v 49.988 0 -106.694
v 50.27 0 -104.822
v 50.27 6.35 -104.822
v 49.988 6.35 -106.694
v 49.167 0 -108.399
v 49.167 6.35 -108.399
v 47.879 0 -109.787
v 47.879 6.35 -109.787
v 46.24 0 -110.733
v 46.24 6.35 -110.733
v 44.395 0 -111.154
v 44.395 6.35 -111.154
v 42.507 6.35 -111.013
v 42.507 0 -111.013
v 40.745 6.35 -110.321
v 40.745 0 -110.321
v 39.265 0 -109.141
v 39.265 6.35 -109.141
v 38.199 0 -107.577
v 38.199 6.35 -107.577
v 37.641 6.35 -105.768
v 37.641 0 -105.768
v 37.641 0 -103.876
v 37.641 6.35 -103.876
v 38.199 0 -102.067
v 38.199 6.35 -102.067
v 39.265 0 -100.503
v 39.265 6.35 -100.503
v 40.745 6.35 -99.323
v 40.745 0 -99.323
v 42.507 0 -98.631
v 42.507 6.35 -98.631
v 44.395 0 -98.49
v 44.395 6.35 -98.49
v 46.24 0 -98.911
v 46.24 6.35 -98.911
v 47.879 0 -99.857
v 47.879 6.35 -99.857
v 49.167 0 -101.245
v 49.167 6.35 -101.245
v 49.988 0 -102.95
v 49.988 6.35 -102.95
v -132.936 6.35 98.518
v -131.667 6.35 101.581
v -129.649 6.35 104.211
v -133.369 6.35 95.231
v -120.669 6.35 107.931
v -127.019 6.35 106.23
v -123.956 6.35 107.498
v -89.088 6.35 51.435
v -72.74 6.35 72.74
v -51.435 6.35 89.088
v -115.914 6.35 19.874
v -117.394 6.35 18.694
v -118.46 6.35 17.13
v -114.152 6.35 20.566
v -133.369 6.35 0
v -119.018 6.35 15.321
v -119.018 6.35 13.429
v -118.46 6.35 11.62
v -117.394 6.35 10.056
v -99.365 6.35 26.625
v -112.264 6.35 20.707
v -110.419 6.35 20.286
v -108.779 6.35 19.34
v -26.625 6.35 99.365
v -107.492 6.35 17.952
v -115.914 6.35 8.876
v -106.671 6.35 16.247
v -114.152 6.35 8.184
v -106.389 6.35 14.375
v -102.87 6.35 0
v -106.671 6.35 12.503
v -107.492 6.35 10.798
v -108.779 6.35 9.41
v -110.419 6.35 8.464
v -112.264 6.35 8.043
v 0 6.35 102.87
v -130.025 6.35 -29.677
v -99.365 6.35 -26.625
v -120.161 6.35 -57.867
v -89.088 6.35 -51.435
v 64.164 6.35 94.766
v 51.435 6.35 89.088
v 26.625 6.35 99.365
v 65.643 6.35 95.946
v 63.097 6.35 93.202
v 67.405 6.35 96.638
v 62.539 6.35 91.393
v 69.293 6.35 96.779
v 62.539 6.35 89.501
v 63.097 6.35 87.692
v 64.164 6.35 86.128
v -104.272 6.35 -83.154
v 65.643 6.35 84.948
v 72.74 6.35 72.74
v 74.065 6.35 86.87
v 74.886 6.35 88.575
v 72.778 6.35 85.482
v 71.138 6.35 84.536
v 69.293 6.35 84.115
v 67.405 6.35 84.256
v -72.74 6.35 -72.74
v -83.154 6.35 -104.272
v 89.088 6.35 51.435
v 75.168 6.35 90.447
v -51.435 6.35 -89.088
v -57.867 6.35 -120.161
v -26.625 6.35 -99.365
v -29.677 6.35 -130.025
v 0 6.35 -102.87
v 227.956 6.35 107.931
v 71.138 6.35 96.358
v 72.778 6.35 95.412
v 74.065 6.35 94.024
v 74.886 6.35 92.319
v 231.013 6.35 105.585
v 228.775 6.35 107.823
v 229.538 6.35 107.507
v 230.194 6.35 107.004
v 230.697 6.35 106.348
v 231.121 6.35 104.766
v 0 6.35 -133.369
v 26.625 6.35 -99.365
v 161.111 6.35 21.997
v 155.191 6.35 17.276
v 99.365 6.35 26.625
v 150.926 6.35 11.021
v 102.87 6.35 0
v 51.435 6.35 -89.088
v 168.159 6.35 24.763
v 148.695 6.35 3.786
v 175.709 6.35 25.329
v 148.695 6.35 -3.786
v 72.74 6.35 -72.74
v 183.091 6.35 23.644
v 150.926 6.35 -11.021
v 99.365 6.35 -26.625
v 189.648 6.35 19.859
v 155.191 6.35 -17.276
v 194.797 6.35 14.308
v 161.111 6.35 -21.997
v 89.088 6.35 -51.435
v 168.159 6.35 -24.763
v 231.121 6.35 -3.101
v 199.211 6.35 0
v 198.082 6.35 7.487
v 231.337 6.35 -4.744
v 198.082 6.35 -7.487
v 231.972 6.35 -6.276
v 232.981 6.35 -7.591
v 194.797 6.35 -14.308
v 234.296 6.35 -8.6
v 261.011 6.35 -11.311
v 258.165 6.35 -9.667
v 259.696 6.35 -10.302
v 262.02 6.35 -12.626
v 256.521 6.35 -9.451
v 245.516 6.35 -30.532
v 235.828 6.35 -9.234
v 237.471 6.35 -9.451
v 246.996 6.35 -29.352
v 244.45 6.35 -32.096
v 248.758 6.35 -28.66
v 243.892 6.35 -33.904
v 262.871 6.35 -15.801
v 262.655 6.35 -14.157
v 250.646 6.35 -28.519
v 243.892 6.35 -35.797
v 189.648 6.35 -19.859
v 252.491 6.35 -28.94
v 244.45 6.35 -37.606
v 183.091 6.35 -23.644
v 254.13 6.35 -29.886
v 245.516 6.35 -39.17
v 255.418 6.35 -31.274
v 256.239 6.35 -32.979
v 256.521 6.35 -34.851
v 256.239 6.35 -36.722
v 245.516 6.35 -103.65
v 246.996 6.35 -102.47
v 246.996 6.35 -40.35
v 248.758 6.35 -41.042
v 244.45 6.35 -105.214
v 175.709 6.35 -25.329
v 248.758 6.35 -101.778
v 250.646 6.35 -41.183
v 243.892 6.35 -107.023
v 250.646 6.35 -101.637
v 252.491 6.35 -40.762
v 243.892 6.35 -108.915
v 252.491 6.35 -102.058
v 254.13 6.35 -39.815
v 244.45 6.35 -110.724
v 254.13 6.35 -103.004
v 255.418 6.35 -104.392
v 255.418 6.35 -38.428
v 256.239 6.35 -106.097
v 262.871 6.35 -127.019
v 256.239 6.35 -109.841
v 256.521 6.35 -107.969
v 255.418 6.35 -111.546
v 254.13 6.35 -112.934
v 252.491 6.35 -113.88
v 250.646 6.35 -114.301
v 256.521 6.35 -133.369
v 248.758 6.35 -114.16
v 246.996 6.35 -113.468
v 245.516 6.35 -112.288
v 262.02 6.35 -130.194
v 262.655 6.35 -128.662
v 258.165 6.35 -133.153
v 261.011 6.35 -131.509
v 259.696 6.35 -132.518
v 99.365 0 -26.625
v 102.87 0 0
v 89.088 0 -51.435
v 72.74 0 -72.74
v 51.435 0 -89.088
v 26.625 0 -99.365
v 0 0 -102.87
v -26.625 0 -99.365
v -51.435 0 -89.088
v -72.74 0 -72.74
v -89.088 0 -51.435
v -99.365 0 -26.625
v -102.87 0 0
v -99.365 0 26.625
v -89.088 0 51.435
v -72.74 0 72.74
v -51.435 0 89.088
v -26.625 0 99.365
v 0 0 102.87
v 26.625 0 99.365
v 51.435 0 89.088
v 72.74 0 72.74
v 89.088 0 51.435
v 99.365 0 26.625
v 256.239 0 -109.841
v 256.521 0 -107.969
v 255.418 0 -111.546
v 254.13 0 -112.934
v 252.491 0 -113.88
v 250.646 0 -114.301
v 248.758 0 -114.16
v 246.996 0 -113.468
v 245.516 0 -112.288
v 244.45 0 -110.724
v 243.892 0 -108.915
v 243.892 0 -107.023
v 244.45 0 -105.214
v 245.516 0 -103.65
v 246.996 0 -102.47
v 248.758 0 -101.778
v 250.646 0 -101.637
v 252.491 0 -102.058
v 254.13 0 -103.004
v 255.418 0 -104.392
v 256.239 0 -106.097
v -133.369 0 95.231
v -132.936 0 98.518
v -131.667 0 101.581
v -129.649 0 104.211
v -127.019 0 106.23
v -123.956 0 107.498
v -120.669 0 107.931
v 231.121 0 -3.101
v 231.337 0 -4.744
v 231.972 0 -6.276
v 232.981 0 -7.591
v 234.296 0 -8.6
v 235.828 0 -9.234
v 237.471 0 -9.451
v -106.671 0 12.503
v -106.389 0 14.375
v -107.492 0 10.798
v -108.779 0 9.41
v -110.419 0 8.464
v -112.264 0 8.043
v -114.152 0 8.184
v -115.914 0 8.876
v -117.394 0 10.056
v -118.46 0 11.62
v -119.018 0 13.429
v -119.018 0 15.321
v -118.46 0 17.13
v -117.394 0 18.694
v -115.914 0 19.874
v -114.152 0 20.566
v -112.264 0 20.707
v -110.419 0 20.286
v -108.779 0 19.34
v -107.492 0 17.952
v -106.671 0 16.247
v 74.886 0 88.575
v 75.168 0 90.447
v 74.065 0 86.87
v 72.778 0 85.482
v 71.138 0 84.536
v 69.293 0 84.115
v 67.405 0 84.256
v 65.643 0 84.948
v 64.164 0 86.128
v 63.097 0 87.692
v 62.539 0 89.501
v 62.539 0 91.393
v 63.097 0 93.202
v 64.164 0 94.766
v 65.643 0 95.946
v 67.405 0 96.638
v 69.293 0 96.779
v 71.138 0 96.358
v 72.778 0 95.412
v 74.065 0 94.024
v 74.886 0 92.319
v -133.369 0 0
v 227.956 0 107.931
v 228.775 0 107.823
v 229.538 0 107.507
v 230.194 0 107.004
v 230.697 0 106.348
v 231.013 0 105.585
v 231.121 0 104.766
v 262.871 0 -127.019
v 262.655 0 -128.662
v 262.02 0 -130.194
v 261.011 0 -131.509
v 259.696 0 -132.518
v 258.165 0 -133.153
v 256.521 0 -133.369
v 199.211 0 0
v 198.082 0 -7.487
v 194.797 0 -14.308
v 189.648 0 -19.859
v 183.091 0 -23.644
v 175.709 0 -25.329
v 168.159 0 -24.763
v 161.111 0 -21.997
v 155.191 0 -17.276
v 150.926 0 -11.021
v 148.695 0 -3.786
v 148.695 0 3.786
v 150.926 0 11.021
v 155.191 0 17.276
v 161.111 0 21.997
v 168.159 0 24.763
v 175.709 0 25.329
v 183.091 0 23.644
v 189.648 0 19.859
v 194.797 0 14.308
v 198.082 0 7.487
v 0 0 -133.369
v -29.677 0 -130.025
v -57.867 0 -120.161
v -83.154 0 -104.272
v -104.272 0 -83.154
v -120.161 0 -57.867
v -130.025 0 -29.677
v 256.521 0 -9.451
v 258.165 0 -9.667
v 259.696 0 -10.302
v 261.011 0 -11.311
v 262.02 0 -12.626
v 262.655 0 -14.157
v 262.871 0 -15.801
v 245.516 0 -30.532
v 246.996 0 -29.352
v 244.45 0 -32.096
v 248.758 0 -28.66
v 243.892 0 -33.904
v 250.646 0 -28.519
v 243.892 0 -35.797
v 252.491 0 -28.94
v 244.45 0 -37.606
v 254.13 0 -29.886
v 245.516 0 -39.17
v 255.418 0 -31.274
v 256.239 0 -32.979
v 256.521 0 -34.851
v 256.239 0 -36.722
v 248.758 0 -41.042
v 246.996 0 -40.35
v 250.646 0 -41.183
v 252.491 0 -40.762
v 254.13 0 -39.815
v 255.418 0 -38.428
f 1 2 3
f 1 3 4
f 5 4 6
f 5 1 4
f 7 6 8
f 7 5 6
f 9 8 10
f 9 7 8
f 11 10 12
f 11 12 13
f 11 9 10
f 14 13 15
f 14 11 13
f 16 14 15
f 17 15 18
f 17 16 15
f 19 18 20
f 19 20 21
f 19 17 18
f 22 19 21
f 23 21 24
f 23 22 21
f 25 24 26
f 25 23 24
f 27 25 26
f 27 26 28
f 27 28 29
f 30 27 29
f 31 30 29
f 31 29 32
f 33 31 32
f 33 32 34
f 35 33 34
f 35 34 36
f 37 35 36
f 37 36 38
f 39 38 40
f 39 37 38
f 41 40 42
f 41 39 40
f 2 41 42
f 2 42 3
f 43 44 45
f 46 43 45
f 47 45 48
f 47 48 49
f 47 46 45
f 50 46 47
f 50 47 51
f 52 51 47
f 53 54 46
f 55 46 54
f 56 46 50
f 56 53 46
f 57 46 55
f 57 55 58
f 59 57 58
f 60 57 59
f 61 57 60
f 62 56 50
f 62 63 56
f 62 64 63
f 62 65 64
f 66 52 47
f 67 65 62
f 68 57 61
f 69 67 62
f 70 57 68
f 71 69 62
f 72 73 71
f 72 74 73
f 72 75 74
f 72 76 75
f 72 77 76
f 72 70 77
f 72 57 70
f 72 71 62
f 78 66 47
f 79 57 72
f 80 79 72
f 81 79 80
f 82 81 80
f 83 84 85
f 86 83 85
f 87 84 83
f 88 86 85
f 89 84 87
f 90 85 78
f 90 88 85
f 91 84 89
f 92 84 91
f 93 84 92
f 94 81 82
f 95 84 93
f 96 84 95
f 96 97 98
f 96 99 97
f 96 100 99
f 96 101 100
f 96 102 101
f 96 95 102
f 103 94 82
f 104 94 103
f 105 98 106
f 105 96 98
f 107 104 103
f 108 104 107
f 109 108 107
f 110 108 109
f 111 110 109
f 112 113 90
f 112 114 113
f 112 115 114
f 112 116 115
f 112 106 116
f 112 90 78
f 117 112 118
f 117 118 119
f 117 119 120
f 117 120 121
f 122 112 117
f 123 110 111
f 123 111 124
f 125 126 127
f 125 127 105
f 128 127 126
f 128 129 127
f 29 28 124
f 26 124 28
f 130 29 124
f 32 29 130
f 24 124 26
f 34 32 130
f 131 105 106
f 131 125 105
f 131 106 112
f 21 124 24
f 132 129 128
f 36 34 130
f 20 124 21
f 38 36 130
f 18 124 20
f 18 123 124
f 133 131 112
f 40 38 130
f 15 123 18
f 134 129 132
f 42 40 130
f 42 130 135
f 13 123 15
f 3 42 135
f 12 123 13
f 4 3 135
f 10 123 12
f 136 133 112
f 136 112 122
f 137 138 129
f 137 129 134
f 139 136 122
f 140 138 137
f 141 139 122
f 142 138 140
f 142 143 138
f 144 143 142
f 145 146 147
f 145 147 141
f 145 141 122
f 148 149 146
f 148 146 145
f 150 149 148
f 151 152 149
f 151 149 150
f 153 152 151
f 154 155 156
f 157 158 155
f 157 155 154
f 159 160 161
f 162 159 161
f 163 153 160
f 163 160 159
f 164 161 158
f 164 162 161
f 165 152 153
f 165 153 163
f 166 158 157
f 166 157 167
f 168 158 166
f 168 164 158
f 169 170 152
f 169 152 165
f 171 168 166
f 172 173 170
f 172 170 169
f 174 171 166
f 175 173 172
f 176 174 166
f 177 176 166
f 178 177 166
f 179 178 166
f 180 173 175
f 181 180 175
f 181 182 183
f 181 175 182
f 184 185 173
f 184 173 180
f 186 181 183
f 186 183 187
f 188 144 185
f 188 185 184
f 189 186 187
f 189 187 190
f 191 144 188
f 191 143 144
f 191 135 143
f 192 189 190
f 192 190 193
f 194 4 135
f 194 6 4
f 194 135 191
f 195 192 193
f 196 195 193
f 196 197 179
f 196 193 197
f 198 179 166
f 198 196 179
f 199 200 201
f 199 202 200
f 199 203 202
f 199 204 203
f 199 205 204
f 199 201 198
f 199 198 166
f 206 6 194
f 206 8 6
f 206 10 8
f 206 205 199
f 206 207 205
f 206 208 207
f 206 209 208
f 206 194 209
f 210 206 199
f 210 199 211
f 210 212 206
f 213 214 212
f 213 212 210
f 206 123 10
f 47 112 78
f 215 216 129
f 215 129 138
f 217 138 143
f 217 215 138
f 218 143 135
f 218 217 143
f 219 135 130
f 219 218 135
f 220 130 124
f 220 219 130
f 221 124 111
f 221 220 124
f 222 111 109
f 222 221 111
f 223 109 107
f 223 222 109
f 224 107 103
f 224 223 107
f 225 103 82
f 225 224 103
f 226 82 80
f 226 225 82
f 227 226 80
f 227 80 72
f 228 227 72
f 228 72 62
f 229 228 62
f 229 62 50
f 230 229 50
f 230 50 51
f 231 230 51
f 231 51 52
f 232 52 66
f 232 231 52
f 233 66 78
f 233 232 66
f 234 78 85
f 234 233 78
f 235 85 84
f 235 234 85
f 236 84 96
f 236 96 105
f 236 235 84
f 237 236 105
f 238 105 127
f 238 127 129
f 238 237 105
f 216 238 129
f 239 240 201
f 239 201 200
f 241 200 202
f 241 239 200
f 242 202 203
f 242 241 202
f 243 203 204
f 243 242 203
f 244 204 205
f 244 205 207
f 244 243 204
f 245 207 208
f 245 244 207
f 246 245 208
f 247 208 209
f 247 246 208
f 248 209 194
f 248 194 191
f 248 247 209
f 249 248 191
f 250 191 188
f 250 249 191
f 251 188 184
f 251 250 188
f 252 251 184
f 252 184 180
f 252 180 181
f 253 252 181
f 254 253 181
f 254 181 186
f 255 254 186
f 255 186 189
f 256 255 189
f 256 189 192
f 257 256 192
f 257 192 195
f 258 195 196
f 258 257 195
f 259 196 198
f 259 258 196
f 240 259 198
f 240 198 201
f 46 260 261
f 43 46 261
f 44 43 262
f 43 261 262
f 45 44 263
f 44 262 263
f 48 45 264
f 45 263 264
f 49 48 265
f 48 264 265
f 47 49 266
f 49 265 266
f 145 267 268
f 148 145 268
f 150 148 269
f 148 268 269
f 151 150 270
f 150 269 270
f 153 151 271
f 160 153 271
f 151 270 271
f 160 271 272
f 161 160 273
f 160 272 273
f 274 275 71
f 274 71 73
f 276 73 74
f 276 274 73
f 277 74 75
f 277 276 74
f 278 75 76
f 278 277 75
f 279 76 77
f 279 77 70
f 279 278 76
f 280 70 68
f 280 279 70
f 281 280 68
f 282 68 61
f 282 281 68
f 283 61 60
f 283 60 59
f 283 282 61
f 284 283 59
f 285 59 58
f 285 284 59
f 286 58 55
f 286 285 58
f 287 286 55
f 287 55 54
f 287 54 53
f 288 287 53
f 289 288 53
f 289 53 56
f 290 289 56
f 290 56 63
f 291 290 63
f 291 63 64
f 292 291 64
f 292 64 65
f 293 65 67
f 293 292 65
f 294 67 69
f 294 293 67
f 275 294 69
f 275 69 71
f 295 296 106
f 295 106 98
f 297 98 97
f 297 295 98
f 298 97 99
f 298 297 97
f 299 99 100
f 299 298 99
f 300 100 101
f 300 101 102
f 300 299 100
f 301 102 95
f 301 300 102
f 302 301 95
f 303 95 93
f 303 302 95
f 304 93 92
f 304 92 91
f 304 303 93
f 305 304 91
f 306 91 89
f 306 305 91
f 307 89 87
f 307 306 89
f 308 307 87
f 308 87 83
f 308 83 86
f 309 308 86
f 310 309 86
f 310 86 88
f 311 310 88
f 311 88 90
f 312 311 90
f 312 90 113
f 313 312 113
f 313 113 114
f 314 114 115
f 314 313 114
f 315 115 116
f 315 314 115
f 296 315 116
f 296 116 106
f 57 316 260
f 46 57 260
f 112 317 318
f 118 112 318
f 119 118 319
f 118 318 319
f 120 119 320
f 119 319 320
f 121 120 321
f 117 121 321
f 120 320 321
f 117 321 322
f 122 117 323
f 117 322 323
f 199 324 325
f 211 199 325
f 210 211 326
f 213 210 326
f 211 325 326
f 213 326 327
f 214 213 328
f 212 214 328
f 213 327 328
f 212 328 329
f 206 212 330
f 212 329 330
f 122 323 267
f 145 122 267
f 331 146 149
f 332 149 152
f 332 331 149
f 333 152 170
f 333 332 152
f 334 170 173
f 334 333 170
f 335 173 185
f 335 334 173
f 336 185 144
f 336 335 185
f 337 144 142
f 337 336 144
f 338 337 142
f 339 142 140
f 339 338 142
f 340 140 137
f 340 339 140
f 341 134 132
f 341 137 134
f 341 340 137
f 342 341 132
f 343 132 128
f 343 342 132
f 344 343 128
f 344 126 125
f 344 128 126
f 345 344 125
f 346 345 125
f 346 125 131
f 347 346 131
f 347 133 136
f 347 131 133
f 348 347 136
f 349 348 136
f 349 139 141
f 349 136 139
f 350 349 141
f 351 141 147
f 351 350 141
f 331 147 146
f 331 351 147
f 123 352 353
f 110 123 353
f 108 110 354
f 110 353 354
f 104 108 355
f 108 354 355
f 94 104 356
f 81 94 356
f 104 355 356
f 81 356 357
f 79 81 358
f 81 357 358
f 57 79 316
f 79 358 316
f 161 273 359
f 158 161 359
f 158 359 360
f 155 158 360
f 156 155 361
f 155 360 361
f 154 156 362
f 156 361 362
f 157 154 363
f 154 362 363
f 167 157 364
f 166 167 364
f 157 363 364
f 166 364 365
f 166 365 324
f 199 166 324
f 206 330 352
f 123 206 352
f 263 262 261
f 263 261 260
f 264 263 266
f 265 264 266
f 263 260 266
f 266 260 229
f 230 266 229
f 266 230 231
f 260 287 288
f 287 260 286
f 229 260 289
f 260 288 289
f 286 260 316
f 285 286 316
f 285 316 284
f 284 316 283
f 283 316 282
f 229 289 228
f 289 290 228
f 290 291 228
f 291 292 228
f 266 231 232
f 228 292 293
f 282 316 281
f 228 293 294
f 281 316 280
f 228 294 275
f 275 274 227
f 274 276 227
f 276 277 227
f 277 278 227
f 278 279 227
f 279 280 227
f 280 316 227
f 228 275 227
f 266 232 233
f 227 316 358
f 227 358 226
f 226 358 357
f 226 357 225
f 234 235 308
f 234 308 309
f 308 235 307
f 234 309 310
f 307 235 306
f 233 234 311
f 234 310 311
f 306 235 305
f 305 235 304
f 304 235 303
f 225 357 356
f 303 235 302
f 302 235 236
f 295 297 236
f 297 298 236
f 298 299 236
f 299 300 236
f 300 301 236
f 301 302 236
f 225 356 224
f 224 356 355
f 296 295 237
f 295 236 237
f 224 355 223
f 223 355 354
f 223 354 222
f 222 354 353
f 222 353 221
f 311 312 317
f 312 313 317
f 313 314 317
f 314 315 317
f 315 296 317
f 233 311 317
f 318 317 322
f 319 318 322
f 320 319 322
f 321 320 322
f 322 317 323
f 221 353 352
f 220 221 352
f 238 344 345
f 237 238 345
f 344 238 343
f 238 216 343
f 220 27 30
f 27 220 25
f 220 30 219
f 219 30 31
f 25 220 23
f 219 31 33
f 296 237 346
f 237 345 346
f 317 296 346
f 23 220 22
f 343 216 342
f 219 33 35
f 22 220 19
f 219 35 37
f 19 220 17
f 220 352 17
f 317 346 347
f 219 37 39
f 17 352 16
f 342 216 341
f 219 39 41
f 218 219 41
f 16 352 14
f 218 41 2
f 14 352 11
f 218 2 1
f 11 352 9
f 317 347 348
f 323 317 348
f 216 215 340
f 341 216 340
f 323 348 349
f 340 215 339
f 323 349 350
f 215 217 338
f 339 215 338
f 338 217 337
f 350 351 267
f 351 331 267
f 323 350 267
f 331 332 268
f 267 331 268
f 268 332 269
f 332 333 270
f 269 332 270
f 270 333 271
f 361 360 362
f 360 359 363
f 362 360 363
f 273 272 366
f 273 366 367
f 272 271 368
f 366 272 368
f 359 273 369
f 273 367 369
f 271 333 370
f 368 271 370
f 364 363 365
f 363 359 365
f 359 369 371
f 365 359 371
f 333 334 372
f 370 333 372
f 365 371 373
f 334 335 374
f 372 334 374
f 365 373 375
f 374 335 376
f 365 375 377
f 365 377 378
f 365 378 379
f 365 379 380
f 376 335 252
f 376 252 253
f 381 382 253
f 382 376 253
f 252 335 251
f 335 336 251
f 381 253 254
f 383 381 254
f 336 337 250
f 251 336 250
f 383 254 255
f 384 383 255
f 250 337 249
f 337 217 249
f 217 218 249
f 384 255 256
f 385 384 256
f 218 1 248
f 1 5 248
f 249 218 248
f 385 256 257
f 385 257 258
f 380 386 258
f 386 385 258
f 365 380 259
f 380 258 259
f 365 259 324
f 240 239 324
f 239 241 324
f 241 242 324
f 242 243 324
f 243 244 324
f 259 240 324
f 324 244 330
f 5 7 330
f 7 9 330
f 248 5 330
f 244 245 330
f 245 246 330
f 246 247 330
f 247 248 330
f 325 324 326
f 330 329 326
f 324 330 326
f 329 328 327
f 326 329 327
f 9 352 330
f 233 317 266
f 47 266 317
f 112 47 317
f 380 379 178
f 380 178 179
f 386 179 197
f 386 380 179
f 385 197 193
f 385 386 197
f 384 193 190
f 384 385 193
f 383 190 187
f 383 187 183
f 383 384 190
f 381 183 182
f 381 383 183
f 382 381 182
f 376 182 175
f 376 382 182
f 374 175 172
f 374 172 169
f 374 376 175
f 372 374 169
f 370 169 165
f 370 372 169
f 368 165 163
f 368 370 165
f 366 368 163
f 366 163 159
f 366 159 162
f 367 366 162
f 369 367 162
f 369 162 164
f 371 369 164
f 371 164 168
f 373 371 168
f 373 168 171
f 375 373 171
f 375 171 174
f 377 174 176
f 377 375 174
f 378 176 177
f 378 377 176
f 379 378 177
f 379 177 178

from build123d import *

# Parameters (mm, degrees)
SKETCH1_R           = 102.87
SKETCH1_R_2         = 6.35
BOSS_EXTRUDE1_DEPTH = 6.35
SKETCH6_R           = 25.4
CUT_EXTRUDE1_DEPTH  = 28.448


with BuildPart() as part:
    # Sketch1 → Boss-Extrude1 (new body)
    with BuildSketch(Plane(origin=(0, 0, 0), x_dir=(1, 0, 0), z_dir=(0, 1, 0))):
        with BuildLine():
            Line((256.521079071, 133.368920929), (0, 133.368920929))
            ThreePointArc((0, 133.368920929), (-94.306068389, 94.306068389), (-133.368920929, 0))
            Line((-133.368920929, 0), (-133.368920929, -95.231079071))
            ThreePointArc((-133.368920929, -95.231079071), (-129.64917705, -104.211335192), (-120.668920929, -107.931079071))
            Line((-120.668920929, -107.931079071), (227.955539535, -107.931079071))
            ThreePointArc((227.955539535, -107.931079071), (230.193914007, -107.003914007), (231.121079071, -104.765539535))
            Line((231.121079071, -104.765539535), (231.121079071, 3.100777109))
            ThreePointArc((231.121079071, 3.100777109), (232.98095101, 7.59090517), (237.471079071, 9.450777109))
            Line((237.471079071, 9.450777109), (256.521079071, 9.450777109))
            ThreePointArc((256.521079071, 9.450777109), (261.011207131, 11.310649048), (262.871079071, 15.800777109))
            Line((262.871079071, 15.800777109), (262.871079071, 127.018920929))
            ThreePointArc((262.871079071, 127.018920929), (261.011207131, 131.50904899), (256.521079071, 133.368920929))
        make_face()
        Circle(SKETCH1_R, mode=Mode.SUBTRACT)
        with Locations((-112.738641363, -14.374963544)):
            Circle(SKETCH1_R_2, mode=Mode.SUBTRACT)
        with Locations((43.920237074, 104.822009181)):
            Circle(SKETCH1_R_2, mode=Mode.SUBTRACT)
        with Locations((68.818404289, -90.447045637)):
            Circle(SKETCH1_R_2, mode=Mode.SUBTRACT)
        with Locations((250.171079071, 107.968920929)):
            Circle(SKETCH1_R_2, mode=Mode.SUBTRACT)
        with Locations((250.171079071, 34.850777109)):
            Circle(SKETCH1_R_2, mode=Mode.SUBTRACT)
    extrude(amount=BOSS_EXTRUDE1_DEPTH)

    # Sketch6 → Cut-Extrude1 (cut)
    with BuildSketch(Plane(origin=(0, 0, 0), x_dir=(1, 0, 0), z_dir=(0, 1, 0))):
        with Locations((173.810939206, 0)):
            Circle(SKETCH6_R)
    extrude(amount=CUT_EXTRUDE1_DEPTH, mode=Mode.SUBTRACT)


solid = part.part
